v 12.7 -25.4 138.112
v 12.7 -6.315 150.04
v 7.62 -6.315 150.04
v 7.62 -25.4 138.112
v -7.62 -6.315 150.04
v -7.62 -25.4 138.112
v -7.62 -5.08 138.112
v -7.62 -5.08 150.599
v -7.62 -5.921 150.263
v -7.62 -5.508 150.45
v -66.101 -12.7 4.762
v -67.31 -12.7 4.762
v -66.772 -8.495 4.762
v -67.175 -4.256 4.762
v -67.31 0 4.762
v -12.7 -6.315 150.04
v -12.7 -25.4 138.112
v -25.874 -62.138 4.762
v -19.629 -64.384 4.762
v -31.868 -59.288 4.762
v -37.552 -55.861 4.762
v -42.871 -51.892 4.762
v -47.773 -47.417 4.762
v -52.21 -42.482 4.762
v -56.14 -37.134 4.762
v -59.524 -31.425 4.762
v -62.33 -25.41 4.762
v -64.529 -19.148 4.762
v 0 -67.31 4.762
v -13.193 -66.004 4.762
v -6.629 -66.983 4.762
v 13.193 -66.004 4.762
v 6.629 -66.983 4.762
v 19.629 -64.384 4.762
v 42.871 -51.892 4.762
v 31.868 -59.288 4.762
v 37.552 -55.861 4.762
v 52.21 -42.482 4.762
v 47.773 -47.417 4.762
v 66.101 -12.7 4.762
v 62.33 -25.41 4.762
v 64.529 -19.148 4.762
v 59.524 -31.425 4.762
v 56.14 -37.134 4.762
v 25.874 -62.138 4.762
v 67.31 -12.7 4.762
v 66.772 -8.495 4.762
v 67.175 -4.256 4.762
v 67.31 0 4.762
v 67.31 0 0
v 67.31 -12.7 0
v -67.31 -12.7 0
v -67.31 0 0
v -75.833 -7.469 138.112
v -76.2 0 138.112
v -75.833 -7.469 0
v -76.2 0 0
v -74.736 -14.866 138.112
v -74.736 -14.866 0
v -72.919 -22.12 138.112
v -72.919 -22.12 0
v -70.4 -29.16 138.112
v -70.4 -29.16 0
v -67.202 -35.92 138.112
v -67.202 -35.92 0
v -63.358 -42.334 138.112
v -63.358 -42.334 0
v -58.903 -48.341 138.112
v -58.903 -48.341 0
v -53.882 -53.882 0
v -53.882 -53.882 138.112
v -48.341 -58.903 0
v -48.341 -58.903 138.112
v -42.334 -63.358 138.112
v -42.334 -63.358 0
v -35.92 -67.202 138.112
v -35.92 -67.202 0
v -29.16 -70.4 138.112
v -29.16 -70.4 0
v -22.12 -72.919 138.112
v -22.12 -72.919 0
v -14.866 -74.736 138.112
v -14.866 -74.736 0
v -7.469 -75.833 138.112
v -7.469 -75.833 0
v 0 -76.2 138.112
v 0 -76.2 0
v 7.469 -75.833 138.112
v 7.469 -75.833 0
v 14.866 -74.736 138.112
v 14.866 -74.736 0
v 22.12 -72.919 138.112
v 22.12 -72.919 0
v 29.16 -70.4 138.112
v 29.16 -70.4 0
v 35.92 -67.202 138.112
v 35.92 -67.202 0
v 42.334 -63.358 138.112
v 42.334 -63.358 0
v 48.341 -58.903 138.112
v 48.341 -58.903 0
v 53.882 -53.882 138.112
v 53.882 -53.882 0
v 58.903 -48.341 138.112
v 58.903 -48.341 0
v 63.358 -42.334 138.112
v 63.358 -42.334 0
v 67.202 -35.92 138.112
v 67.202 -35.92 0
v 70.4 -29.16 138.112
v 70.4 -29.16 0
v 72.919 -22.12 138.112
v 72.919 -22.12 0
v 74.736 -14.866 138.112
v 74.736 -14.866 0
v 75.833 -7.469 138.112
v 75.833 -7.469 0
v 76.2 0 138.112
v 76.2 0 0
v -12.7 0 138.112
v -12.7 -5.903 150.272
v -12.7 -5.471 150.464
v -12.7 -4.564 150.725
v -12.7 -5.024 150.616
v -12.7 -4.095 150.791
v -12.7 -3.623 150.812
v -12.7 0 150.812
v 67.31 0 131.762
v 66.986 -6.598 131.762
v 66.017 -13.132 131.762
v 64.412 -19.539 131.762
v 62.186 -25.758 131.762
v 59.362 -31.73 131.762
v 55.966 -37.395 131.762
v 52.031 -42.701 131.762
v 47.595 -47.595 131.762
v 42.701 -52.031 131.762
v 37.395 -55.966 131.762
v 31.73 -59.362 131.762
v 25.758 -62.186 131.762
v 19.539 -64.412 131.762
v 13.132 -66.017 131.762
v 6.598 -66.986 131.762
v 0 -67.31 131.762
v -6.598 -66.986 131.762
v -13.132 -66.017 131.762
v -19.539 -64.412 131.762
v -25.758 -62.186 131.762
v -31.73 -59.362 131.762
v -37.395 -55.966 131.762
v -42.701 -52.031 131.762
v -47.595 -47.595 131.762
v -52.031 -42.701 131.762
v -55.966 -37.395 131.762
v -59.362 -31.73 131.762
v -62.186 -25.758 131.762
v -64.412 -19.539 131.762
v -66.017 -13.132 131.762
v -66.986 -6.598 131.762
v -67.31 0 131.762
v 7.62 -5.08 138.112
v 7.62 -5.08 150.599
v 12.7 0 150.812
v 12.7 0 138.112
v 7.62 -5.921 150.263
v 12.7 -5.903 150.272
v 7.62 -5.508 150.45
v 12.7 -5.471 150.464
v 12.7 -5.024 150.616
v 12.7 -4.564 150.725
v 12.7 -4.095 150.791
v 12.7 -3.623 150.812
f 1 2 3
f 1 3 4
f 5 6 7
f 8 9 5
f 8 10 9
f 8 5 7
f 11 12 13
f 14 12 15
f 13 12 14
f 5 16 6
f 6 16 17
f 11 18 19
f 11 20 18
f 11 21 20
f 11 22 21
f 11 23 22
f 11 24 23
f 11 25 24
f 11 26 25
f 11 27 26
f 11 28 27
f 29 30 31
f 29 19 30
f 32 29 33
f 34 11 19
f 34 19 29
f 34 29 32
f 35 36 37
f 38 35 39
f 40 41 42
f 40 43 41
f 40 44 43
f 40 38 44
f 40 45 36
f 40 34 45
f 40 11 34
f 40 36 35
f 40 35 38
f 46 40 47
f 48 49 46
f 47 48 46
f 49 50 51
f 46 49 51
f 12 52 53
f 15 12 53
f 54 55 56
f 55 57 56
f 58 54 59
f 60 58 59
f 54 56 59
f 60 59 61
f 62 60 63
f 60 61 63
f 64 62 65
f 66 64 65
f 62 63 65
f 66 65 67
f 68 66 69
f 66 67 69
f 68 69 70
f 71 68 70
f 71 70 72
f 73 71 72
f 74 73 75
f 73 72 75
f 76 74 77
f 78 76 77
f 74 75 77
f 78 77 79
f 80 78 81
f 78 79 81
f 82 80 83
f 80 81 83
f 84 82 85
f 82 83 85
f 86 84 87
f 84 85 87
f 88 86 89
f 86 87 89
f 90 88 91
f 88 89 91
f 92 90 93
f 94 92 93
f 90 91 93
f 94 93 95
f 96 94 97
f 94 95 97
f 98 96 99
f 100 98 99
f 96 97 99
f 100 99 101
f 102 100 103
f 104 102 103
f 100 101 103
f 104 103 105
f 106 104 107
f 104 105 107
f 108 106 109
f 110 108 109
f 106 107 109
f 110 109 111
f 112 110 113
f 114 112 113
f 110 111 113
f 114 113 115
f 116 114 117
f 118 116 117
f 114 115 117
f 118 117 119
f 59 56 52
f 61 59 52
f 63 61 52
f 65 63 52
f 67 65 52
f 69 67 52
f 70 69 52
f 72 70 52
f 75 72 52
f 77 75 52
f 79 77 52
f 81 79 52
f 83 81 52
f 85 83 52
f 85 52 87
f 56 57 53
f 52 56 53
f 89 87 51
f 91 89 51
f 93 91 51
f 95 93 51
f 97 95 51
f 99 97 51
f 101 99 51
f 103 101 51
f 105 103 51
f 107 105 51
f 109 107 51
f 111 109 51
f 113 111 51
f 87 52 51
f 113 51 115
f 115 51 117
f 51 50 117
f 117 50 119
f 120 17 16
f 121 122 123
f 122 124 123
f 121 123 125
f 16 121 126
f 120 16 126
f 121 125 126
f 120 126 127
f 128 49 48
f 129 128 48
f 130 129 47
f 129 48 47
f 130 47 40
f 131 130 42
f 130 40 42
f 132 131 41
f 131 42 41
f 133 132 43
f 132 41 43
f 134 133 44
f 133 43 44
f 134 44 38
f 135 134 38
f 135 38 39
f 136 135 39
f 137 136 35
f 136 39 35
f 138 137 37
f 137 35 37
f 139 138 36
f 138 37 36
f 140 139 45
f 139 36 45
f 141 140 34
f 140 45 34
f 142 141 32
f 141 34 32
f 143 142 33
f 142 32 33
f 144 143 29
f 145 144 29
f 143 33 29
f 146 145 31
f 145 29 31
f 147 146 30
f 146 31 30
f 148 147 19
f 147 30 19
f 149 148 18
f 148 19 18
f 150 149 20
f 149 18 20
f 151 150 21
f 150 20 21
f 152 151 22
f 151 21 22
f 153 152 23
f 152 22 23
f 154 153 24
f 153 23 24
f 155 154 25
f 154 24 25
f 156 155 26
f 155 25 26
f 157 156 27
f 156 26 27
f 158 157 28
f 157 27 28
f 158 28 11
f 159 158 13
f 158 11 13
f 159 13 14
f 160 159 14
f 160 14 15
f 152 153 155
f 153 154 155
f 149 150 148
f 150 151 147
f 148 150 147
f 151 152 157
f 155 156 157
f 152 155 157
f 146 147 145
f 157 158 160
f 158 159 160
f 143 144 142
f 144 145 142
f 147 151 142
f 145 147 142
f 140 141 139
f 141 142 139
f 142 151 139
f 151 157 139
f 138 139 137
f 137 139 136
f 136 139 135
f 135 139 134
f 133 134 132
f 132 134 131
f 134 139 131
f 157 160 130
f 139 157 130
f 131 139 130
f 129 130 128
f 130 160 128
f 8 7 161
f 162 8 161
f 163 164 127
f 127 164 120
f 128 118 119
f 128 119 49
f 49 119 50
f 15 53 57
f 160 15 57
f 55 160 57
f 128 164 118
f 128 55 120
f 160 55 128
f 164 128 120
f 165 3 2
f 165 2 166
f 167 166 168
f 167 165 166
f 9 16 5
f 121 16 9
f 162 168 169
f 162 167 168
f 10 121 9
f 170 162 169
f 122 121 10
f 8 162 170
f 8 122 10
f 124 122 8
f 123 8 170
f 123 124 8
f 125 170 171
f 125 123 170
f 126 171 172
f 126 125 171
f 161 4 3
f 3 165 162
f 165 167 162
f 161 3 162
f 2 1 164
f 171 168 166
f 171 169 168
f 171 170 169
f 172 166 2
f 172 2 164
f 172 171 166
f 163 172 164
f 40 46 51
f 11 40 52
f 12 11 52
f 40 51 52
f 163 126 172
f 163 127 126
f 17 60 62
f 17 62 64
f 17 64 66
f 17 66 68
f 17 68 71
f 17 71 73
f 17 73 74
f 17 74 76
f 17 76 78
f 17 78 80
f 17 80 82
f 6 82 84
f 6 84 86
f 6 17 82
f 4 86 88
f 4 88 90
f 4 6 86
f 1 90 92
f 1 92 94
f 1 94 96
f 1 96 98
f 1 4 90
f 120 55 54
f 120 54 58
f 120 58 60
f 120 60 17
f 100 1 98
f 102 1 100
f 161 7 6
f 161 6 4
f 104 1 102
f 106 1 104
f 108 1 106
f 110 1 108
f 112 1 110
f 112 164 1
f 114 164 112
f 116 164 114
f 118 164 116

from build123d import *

# Parameters (mm, degrees)
F1_DEPTH     = 4.7625
F3_DEPTH     = 127
F5_DEPTH     = 6.35
F7_DEPTH     = 12.7
F9_DEPTH     = 5.08
F10_T1_DEPTH = 22.563097962
F10_T3_DEPTH = 22.563097962


# Not quite as in the source:
# - a fillet or chamfer that OpenCascade refuses, or shapes differently, is made with other operations: its cross-section is extruded or revolved along the edge and cut away or added
# - a length typed as a fraction of an inch, garbled in the dataset ("3 / 203.2 mm" for 3/8 in), is restored
# - a pattern or mirror of a feature is missing from the dataset's text; its kind, count and spacing are read off the source's solid


with BuildPart() as f1:
    # F0 (on Top) → F1 (new body)
    with BuildSketch(Plane.XY):
        with BuildLine():
            ThreePointArc((-76.2, 0), (0, -76.2), (76.2, 0))
            Line((76.2, 0), (67.31, 0))
            Line((67.31, 0), (67.31, -12.7))
            Line((67.31, -12.7), (-67.31, -12.7))
            Line((-67.31, -12.7), (-67.31, 0))
            Line((-67.31, 0), (-76.2, 0))
        make_face()
    extrude(amount=F1_DEPTH)

    # F2 (on face) → F3 (join)
    with BuildSketch(Plane.XY.offset(4.7625)):
        with BuildLine():
            Line((-67.31, 0), (-76.2, 0))
            ThreePointArc((-76.2, 0), (0, -76.2), (76.2, 0))
            Line((76.2, 0), (67.31, 0))
            ThreePointArc((67.31, 0), (0, -67.31), (-67.31, 0))
        make_face()
    extrude(amount=F3_DEPTH)

    # F4 (on face) → F5 (join)
    with BuildSketch(Plane.XY.offset(131.7625)):
        with BuildLine():
            Line((76.2, 0), (-76.2, 0))
            ThreePointArc((-76.2, 0), (0, -76.2), (76.2, 0))
        make_face()
    extrude(amount=F5_DEPTH)

    # F6 (on face) → F7 (join)
    with BuildSketch(Plane.XY.offset(138.1125)):
        Polygon((12.7, 0), (0, 0), (-12.7, 0), (-12.7, -5.08), (0, -5.08), (12.7, -5.08), align=None)
    extrude(amount=F7_DEPTH)

    # F8 (on face) → F9 (join)
    with BuildSketch(Plane.YZ.offset(12.7)):
        Polygon((-5.08, 150.8125), (-25.4, 138.1125), (-5.08, 138.1125), align=None)
    f9 = extrude(amount=-F9_DEPTH)

    # F9_copies: F9 across plane
    add(f9.mirror(Plane(origin=(0, 0, 0), x_dir=(0, 0, -1), z_dir=(-1, 0, 0))))

    # F10: fillet of radius 5.08 on 2 edges, made by hand

    # F10_s2 → F10_t1 (cut)
    with BuildSketch(Plane.YZ.offset(-21.441548981)):
        with BuildLine():
            ThreePointArc((-6.315469785, 150.0403313843), (-5.0235423361, 150.6156436305), (-3.6230751698, 150.8125))
            Line((-3.6230751698, 150.8125), (-3.6230751698, 150.9141))
            Line((-3.6230751698, 150.9141), (-5.1091384966, 150.9141))
            Line((-5.1091384966, 150.9141), (-6.3693176774, 150.126488012))
            Line((-6.3693176774, 150.126488012), (-6.315469785, 150.0403313843))
        make_face()
    extrude(amount=F10_T1_DEPTH, mode=Mode.SUBTRACT)

    # F10_s4 → F10_t3 (cut)
    with BuildSketch(Plane.YZ.offset(-1.121548981)):
        with BuildLine():
            ThreePointArc((-3.6230751698, 150.8125), (-5.0235423361, 150.6156436305), (-6.315469785, 150.0403313843))
            Line((-6.315469785, 150.0403313843), (-6.3693176774, 150.126488012))
            Line((-6.3693176774, 150.126488012), (-5.1091384966, 150.9141))
            Line((-5.1091384966, 150.9141), (-3.6230751698, 150.9141))
            Line((-3.6230751698, 150.9141), (-3.6230751698, 150.8125))
        make_face()
    extrude(amount=F10_T3_DEPTH, mode=Mode.SUBTRACT)


solid = f1.part
